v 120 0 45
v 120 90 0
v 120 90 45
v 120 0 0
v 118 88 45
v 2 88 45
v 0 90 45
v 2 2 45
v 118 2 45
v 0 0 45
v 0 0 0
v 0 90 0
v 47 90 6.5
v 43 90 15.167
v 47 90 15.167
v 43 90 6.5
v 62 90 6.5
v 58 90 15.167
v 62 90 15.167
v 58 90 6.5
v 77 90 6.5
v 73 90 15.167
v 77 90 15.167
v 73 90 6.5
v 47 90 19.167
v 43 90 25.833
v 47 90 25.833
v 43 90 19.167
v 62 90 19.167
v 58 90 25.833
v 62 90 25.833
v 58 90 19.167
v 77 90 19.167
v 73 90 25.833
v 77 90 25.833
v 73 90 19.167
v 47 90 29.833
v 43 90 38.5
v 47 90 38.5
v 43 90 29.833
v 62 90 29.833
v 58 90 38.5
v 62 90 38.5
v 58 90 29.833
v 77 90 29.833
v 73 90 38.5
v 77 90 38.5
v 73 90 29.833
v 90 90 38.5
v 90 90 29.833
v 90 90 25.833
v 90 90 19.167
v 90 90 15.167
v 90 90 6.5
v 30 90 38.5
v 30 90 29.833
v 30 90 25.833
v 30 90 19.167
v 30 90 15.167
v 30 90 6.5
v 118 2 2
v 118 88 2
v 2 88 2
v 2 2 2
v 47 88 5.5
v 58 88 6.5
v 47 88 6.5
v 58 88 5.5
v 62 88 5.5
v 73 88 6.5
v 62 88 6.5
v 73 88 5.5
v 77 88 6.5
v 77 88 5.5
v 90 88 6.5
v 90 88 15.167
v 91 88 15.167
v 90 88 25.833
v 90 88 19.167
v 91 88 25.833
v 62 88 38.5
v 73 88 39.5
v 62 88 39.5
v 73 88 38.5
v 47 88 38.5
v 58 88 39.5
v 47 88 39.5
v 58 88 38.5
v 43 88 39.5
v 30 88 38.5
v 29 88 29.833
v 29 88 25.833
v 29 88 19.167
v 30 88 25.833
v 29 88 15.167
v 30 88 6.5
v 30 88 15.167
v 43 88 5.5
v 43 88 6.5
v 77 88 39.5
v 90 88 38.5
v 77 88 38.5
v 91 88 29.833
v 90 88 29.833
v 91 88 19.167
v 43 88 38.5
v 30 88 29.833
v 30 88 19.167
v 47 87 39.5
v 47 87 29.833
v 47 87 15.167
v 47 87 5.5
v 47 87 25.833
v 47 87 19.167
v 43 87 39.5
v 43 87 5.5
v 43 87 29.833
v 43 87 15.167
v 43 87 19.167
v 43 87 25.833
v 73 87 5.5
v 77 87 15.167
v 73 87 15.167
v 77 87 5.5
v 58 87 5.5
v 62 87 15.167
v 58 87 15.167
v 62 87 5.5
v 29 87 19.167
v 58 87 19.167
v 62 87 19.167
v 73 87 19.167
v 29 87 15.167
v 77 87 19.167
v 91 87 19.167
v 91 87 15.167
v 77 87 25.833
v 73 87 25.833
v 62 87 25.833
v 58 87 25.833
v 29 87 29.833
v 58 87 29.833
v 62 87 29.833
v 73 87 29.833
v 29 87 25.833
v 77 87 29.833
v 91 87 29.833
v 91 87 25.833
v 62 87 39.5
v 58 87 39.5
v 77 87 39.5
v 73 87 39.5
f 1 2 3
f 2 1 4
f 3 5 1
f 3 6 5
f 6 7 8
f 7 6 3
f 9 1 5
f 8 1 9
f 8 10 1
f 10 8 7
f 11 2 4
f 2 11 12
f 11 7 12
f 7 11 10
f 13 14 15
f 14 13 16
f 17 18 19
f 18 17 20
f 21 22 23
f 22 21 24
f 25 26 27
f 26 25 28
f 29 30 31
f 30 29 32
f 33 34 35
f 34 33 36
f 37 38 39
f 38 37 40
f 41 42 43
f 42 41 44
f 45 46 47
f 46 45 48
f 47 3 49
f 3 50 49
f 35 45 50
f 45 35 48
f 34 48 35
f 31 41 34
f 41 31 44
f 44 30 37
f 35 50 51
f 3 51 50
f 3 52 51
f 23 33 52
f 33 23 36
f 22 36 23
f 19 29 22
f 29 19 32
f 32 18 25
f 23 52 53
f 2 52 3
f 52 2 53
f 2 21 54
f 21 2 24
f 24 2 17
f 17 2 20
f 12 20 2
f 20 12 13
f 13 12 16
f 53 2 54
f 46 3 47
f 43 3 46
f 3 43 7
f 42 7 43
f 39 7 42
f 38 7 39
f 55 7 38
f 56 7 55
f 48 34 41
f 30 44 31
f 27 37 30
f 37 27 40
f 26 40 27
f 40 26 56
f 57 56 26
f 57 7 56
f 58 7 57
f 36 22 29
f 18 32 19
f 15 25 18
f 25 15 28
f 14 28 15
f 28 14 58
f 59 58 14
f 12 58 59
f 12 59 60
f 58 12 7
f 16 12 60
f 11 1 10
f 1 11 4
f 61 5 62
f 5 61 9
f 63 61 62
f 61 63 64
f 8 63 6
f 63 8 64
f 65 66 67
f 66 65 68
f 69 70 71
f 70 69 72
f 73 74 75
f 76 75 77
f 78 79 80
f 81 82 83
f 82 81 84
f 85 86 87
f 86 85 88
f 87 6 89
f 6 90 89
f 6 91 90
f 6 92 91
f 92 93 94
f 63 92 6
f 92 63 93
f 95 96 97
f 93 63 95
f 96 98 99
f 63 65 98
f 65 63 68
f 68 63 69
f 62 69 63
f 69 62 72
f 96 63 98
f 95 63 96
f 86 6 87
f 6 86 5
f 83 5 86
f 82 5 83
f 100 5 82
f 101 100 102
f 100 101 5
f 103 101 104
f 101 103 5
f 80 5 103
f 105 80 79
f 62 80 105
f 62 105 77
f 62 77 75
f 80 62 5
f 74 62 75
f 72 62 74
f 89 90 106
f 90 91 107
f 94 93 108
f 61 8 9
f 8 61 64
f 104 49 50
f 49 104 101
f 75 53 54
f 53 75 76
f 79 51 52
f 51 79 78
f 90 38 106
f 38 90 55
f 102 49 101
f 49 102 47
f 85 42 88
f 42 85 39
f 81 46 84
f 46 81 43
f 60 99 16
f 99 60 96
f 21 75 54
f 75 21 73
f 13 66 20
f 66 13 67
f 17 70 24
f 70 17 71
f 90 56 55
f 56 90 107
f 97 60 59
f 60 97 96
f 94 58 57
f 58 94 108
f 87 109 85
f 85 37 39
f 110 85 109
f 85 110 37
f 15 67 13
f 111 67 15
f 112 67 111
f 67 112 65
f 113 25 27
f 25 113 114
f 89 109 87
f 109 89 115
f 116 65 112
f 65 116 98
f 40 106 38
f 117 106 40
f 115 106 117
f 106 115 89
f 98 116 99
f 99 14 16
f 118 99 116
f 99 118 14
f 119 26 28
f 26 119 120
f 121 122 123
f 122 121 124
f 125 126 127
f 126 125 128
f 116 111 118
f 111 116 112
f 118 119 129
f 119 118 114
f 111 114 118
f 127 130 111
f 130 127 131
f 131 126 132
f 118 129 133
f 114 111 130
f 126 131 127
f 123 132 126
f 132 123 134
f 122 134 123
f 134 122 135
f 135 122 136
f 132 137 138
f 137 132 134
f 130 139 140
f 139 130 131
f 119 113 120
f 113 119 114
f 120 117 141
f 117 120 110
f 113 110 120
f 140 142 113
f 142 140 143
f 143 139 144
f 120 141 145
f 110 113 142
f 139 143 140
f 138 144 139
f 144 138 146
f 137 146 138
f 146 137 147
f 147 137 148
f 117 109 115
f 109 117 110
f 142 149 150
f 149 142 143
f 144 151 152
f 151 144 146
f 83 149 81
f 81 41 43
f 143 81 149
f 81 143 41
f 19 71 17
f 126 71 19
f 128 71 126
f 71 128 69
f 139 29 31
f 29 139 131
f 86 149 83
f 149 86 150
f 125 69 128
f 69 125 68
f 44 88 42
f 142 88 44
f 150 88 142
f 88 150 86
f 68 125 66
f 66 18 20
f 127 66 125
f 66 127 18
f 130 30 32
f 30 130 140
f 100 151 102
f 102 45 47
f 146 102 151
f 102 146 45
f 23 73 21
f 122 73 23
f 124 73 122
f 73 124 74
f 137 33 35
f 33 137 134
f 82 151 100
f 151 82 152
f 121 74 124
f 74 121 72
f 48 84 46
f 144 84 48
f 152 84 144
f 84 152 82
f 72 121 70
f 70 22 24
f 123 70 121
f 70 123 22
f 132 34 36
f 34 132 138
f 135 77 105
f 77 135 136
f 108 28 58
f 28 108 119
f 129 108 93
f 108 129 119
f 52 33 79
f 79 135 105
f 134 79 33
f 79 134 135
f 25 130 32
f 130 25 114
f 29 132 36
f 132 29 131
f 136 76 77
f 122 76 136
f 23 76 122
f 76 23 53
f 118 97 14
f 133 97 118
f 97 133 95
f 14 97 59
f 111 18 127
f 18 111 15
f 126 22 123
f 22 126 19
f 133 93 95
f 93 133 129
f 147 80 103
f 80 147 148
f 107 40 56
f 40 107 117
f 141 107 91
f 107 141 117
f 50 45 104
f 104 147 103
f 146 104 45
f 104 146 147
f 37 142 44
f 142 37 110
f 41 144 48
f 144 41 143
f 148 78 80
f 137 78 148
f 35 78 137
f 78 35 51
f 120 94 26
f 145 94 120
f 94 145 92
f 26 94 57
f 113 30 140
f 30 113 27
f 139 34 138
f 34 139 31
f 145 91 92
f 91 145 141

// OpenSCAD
$fn = 32;

// ----------------------------------------------------------------------
// Vent box: crossgrid enclosure
// ----------------------------------------------------------------------

// --- parameters (mm) ---
box_l = 120;              // box length, X
box_w = 90;               // box width, Y
box_h = 45;               // box height, Z
wall_t = 2;               // shell wall thickness
win_l = 60;               // vent window width, X
win_h = 32;               // vent window height, Z
bar_w = 4;                // grid bar width
n_v = 3;                  // vertical bar count
n_h = 2;                  // horizontal bar count

win_z0 = (box_h - win_h) / 2;  // window lower edge Z
v_step = win_l / (n_v + 1);  // vertical bar step
h_step = win_h / (n_h + 1);  // horizontal bar step

difference() {
  union() {
    difference() {
      cube([box_l, box_w, box_h]);
  translate([wall_t, wall_t, wall_t])
    cube([box_l - 2 * wall_t, box_w - 2 * wall_t, box_h]);
  translate([(box_l - win_l) / 2, box_w - wall_t - 1, win_z0])
    cube([win_l, wall_t + 2, win_h]);
    }
    for (i = [1 : n_v])
      translate([(box_l - win_l) / 2 + i * v_step - bar_w / 2,
                 box_w - wall_t - 1, win_z0 - 1])
        cube([bar_w, wall_t + 1, win_h + 2]);
    for (i = [1 : n_h])
      translate([(box_l - win_l) / 2 - 1, box_w - wall_t - 1,
                 win_z0 + i * h_step - bar_w / 2])
        cube([win_l + 2, wall_t + 1, bar_w]);
  }
}
